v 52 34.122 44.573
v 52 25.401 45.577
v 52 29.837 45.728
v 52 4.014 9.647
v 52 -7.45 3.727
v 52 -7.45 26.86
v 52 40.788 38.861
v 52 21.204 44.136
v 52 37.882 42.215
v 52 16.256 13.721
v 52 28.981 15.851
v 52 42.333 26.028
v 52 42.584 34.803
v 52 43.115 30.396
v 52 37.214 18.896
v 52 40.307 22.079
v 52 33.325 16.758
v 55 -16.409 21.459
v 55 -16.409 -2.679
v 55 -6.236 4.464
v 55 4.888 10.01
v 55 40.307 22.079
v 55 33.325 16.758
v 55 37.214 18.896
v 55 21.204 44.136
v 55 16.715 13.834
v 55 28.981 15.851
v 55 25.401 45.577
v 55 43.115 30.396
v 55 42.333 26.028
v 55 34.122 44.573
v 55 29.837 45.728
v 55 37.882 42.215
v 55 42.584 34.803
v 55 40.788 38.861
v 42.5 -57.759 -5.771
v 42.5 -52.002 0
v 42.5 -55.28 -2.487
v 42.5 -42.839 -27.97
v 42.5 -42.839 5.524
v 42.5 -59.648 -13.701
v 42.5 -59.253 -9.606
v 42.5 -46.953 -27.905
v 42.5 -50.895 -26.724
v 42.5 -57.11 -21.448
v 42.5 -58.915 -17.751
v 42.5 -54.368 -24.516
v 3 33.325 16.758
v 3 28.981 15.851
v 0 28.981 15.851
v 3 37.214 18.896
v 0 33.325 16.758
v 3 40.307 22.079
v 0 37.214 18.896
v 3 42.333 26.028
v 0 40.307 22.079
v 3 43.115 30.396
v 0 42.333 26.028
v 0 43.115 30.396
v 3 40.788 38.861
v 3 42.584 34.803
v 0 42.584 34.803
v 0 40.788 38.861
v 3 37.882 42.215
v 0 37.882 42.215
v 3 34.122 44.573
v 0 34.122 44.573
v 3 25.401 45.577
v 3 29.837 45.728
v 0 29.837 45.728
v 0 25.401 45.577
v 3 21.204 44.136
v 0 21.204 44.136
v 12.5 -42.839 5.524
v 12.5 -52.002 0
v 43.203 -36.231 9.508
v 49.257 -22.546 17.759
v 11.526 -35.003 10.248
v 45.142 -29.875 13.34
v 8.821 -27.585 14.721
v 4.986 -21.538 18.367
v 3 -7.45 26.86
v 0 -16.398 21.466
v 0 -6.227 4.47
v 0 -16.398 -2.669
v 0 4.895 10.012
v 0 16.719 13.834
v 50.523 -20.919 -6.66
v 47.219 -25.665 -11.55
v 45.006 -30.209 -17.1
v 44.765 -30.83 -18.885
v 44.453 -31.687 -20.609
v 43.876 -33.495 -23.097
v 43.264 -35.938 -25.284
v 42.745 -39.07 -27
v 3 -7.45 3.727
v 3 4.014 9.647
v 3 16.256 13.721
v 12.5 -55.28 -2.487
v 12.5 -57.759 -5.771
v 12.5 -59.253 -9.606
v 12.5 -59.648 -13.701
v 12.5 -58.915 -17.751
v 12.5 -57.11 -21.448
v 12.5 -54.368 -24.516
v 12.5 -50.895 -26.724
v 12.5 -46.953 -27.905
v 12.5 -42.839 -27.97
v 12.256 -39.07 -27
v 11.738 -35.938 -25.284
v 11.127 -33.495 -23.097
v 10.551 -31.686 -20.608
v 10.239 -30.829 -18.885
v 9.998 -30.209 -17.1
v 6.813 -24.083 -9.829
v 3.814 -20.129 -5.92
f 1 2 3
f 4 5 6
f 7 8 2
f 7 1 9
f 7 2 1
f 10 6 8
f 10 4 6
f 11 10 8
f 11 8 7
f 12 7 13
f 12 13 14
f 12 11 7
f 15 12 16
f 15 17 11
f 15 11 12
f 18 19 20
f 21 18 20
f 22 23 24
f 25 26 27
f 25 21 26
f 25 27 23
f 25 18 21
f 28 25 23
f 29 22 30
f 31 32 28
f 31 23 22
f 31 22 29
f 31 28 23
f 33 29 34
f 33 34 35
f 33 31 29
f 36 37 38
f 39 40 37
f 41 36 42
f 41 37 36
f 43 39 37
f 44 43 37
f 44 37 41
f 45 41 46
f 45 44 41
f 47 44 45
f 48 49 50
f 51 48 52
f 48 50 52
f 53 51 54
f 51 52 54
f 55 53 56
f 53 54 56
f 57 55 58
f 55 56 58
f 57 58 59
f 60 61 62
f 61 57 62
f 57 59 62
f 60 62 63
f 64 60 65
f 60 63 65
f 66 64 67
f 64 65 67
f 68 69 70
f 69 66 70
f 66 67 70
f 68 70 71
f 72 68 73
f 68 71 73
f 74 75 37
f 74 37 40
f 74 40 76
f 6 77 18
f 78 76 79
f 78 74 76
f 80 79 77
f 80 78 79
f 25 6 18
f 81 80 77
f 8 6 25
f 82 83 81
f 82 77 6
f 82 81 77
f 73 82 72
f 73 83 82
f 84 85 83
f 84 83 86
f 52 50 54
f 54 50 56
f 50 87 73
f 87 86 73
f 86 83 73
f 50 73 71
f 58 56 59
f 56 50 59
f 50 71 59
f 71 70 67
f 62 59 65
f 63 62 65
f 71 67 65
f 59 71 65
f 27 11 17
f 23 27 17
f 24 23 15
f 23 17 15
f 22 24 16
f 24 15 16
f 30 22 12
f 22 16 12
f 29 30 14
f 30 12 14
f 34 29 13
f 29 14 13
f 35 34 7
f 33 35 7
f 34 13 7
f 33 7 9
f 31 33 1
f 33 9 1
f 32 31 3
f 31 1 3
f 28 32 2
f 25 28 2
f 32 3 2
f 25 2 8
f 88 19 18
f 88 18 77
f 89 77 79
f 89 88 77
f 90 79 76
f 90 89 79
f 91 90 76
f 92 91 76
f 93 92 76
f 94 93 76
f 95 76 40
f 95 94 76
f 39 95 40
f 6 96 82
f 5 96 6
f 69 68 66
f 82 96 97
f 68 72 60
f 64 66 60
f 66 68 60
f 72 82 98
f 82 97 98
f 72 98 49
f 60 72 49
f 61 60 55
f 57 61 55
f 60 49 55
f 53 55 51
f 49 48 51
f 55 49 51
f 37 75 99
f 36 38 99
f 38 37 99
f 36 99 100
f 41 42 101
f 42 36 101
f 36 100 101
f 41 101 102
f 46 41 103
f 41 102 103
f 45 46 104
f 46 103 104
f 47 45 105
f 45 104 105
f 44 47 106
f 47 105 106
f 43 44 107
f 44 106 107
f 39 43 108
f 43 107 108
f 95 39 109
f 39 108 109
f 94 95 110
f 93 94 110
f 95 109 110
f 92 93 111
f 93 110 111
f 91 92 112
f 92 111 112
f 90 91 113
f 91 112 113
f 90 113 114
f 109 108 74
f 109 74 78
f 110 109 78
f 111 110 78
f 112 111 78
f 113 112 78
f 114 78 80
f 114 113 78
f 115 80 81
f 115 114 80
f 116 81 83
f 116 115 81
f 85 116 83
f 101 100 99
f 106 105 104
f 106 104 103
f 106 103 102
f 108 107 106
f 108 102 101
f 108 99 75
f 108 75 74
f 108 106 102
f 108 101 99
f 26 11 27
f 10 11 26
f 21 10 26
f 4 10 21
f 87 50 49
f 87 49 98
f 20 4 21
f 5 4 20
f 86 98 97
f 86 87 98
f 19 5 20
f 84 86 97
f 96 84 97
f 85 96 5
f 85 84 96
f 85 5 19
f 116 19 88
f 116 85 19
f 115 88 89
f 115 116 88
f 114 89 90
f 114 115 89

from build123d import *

# Parameters (mm, degrees)
PAD_DEPTH       = 55
SKETCH001_W     = 49
SKETCH001_H     = 60.9
POCKET_DEPTH    = 500
POCKET001_DEPTH = 500


with BuildPart() as part:
    # Sketch → Pad (new body)
    with BuildSketch(Plane.YZ):
        with BuildLine():
            ThreePointArc((28.980657, 15.850683), (42.584206, 34.802551), (21.20392, 44.135996))
            Line((-52.001908, 0), (21.20392, 44.135996))
            ThreePointArc((-52.001908, 0), (-53.920439, -24.881725), (-30.209248, -17.099671))
            ThreePointArc((28.980657, 15.850683), (-4.124344, 5.680733), (-30.209248, -17.099671))
        make_face()
    extrude(amount=PAD_DEPTH)

    # Sketch001 → Pocket (cut)
    with BuildSketch(Plane(origin=(27.5, 23, -50), x_dir=(1, 0, 0), z_dir=(0, 0, 1))):
        Rectangle(SKETCH001_W, SKETCH001_H)
    extrude(amount=POCKET_DEPTH, mode=Mode.SUBTRACT)

    # Sketch002 → Pocket001 (cut)
    with BuildSketch(Plane(origin=(27.5, -35, -50), x_dir=(1, 0, 0), z_dir=(0, 0, 1))):
        with BuildLine():
            Line((-49.999941, -8.209968), (-49.999941, -38.209968))
            Line((-49.999941, -38.209968), (-15, -38.209968))
            Line((-15, -38.209968), (-15, -7.838993))
            ThreePointArc((-15, -7.838993), (-25.381364, 16.670931), (-49.999941, 26.791938))
            Line((-49.999941, 26.791938), (-49.999941, -8.209968))
        make_face()
        with BuildLine():
            Line((15, -7.838993), (15, -38.220366))
            Line((15, -38.220366), (49.997922, -38.220366))
            Line((49.997922, -38.220366), (49.997922, -8.220366))
            Line((49.99995, 26.779634), (49.997922, -8.220366))
            ThreePointArc((49.99995, 26.779634), (25.385111, 16.663555), (15, -7.838993))
        make_face()
    extrude(amount=POCKET001_DEPTH, mode=Mode.SUBTRACT)


solid = part.part
